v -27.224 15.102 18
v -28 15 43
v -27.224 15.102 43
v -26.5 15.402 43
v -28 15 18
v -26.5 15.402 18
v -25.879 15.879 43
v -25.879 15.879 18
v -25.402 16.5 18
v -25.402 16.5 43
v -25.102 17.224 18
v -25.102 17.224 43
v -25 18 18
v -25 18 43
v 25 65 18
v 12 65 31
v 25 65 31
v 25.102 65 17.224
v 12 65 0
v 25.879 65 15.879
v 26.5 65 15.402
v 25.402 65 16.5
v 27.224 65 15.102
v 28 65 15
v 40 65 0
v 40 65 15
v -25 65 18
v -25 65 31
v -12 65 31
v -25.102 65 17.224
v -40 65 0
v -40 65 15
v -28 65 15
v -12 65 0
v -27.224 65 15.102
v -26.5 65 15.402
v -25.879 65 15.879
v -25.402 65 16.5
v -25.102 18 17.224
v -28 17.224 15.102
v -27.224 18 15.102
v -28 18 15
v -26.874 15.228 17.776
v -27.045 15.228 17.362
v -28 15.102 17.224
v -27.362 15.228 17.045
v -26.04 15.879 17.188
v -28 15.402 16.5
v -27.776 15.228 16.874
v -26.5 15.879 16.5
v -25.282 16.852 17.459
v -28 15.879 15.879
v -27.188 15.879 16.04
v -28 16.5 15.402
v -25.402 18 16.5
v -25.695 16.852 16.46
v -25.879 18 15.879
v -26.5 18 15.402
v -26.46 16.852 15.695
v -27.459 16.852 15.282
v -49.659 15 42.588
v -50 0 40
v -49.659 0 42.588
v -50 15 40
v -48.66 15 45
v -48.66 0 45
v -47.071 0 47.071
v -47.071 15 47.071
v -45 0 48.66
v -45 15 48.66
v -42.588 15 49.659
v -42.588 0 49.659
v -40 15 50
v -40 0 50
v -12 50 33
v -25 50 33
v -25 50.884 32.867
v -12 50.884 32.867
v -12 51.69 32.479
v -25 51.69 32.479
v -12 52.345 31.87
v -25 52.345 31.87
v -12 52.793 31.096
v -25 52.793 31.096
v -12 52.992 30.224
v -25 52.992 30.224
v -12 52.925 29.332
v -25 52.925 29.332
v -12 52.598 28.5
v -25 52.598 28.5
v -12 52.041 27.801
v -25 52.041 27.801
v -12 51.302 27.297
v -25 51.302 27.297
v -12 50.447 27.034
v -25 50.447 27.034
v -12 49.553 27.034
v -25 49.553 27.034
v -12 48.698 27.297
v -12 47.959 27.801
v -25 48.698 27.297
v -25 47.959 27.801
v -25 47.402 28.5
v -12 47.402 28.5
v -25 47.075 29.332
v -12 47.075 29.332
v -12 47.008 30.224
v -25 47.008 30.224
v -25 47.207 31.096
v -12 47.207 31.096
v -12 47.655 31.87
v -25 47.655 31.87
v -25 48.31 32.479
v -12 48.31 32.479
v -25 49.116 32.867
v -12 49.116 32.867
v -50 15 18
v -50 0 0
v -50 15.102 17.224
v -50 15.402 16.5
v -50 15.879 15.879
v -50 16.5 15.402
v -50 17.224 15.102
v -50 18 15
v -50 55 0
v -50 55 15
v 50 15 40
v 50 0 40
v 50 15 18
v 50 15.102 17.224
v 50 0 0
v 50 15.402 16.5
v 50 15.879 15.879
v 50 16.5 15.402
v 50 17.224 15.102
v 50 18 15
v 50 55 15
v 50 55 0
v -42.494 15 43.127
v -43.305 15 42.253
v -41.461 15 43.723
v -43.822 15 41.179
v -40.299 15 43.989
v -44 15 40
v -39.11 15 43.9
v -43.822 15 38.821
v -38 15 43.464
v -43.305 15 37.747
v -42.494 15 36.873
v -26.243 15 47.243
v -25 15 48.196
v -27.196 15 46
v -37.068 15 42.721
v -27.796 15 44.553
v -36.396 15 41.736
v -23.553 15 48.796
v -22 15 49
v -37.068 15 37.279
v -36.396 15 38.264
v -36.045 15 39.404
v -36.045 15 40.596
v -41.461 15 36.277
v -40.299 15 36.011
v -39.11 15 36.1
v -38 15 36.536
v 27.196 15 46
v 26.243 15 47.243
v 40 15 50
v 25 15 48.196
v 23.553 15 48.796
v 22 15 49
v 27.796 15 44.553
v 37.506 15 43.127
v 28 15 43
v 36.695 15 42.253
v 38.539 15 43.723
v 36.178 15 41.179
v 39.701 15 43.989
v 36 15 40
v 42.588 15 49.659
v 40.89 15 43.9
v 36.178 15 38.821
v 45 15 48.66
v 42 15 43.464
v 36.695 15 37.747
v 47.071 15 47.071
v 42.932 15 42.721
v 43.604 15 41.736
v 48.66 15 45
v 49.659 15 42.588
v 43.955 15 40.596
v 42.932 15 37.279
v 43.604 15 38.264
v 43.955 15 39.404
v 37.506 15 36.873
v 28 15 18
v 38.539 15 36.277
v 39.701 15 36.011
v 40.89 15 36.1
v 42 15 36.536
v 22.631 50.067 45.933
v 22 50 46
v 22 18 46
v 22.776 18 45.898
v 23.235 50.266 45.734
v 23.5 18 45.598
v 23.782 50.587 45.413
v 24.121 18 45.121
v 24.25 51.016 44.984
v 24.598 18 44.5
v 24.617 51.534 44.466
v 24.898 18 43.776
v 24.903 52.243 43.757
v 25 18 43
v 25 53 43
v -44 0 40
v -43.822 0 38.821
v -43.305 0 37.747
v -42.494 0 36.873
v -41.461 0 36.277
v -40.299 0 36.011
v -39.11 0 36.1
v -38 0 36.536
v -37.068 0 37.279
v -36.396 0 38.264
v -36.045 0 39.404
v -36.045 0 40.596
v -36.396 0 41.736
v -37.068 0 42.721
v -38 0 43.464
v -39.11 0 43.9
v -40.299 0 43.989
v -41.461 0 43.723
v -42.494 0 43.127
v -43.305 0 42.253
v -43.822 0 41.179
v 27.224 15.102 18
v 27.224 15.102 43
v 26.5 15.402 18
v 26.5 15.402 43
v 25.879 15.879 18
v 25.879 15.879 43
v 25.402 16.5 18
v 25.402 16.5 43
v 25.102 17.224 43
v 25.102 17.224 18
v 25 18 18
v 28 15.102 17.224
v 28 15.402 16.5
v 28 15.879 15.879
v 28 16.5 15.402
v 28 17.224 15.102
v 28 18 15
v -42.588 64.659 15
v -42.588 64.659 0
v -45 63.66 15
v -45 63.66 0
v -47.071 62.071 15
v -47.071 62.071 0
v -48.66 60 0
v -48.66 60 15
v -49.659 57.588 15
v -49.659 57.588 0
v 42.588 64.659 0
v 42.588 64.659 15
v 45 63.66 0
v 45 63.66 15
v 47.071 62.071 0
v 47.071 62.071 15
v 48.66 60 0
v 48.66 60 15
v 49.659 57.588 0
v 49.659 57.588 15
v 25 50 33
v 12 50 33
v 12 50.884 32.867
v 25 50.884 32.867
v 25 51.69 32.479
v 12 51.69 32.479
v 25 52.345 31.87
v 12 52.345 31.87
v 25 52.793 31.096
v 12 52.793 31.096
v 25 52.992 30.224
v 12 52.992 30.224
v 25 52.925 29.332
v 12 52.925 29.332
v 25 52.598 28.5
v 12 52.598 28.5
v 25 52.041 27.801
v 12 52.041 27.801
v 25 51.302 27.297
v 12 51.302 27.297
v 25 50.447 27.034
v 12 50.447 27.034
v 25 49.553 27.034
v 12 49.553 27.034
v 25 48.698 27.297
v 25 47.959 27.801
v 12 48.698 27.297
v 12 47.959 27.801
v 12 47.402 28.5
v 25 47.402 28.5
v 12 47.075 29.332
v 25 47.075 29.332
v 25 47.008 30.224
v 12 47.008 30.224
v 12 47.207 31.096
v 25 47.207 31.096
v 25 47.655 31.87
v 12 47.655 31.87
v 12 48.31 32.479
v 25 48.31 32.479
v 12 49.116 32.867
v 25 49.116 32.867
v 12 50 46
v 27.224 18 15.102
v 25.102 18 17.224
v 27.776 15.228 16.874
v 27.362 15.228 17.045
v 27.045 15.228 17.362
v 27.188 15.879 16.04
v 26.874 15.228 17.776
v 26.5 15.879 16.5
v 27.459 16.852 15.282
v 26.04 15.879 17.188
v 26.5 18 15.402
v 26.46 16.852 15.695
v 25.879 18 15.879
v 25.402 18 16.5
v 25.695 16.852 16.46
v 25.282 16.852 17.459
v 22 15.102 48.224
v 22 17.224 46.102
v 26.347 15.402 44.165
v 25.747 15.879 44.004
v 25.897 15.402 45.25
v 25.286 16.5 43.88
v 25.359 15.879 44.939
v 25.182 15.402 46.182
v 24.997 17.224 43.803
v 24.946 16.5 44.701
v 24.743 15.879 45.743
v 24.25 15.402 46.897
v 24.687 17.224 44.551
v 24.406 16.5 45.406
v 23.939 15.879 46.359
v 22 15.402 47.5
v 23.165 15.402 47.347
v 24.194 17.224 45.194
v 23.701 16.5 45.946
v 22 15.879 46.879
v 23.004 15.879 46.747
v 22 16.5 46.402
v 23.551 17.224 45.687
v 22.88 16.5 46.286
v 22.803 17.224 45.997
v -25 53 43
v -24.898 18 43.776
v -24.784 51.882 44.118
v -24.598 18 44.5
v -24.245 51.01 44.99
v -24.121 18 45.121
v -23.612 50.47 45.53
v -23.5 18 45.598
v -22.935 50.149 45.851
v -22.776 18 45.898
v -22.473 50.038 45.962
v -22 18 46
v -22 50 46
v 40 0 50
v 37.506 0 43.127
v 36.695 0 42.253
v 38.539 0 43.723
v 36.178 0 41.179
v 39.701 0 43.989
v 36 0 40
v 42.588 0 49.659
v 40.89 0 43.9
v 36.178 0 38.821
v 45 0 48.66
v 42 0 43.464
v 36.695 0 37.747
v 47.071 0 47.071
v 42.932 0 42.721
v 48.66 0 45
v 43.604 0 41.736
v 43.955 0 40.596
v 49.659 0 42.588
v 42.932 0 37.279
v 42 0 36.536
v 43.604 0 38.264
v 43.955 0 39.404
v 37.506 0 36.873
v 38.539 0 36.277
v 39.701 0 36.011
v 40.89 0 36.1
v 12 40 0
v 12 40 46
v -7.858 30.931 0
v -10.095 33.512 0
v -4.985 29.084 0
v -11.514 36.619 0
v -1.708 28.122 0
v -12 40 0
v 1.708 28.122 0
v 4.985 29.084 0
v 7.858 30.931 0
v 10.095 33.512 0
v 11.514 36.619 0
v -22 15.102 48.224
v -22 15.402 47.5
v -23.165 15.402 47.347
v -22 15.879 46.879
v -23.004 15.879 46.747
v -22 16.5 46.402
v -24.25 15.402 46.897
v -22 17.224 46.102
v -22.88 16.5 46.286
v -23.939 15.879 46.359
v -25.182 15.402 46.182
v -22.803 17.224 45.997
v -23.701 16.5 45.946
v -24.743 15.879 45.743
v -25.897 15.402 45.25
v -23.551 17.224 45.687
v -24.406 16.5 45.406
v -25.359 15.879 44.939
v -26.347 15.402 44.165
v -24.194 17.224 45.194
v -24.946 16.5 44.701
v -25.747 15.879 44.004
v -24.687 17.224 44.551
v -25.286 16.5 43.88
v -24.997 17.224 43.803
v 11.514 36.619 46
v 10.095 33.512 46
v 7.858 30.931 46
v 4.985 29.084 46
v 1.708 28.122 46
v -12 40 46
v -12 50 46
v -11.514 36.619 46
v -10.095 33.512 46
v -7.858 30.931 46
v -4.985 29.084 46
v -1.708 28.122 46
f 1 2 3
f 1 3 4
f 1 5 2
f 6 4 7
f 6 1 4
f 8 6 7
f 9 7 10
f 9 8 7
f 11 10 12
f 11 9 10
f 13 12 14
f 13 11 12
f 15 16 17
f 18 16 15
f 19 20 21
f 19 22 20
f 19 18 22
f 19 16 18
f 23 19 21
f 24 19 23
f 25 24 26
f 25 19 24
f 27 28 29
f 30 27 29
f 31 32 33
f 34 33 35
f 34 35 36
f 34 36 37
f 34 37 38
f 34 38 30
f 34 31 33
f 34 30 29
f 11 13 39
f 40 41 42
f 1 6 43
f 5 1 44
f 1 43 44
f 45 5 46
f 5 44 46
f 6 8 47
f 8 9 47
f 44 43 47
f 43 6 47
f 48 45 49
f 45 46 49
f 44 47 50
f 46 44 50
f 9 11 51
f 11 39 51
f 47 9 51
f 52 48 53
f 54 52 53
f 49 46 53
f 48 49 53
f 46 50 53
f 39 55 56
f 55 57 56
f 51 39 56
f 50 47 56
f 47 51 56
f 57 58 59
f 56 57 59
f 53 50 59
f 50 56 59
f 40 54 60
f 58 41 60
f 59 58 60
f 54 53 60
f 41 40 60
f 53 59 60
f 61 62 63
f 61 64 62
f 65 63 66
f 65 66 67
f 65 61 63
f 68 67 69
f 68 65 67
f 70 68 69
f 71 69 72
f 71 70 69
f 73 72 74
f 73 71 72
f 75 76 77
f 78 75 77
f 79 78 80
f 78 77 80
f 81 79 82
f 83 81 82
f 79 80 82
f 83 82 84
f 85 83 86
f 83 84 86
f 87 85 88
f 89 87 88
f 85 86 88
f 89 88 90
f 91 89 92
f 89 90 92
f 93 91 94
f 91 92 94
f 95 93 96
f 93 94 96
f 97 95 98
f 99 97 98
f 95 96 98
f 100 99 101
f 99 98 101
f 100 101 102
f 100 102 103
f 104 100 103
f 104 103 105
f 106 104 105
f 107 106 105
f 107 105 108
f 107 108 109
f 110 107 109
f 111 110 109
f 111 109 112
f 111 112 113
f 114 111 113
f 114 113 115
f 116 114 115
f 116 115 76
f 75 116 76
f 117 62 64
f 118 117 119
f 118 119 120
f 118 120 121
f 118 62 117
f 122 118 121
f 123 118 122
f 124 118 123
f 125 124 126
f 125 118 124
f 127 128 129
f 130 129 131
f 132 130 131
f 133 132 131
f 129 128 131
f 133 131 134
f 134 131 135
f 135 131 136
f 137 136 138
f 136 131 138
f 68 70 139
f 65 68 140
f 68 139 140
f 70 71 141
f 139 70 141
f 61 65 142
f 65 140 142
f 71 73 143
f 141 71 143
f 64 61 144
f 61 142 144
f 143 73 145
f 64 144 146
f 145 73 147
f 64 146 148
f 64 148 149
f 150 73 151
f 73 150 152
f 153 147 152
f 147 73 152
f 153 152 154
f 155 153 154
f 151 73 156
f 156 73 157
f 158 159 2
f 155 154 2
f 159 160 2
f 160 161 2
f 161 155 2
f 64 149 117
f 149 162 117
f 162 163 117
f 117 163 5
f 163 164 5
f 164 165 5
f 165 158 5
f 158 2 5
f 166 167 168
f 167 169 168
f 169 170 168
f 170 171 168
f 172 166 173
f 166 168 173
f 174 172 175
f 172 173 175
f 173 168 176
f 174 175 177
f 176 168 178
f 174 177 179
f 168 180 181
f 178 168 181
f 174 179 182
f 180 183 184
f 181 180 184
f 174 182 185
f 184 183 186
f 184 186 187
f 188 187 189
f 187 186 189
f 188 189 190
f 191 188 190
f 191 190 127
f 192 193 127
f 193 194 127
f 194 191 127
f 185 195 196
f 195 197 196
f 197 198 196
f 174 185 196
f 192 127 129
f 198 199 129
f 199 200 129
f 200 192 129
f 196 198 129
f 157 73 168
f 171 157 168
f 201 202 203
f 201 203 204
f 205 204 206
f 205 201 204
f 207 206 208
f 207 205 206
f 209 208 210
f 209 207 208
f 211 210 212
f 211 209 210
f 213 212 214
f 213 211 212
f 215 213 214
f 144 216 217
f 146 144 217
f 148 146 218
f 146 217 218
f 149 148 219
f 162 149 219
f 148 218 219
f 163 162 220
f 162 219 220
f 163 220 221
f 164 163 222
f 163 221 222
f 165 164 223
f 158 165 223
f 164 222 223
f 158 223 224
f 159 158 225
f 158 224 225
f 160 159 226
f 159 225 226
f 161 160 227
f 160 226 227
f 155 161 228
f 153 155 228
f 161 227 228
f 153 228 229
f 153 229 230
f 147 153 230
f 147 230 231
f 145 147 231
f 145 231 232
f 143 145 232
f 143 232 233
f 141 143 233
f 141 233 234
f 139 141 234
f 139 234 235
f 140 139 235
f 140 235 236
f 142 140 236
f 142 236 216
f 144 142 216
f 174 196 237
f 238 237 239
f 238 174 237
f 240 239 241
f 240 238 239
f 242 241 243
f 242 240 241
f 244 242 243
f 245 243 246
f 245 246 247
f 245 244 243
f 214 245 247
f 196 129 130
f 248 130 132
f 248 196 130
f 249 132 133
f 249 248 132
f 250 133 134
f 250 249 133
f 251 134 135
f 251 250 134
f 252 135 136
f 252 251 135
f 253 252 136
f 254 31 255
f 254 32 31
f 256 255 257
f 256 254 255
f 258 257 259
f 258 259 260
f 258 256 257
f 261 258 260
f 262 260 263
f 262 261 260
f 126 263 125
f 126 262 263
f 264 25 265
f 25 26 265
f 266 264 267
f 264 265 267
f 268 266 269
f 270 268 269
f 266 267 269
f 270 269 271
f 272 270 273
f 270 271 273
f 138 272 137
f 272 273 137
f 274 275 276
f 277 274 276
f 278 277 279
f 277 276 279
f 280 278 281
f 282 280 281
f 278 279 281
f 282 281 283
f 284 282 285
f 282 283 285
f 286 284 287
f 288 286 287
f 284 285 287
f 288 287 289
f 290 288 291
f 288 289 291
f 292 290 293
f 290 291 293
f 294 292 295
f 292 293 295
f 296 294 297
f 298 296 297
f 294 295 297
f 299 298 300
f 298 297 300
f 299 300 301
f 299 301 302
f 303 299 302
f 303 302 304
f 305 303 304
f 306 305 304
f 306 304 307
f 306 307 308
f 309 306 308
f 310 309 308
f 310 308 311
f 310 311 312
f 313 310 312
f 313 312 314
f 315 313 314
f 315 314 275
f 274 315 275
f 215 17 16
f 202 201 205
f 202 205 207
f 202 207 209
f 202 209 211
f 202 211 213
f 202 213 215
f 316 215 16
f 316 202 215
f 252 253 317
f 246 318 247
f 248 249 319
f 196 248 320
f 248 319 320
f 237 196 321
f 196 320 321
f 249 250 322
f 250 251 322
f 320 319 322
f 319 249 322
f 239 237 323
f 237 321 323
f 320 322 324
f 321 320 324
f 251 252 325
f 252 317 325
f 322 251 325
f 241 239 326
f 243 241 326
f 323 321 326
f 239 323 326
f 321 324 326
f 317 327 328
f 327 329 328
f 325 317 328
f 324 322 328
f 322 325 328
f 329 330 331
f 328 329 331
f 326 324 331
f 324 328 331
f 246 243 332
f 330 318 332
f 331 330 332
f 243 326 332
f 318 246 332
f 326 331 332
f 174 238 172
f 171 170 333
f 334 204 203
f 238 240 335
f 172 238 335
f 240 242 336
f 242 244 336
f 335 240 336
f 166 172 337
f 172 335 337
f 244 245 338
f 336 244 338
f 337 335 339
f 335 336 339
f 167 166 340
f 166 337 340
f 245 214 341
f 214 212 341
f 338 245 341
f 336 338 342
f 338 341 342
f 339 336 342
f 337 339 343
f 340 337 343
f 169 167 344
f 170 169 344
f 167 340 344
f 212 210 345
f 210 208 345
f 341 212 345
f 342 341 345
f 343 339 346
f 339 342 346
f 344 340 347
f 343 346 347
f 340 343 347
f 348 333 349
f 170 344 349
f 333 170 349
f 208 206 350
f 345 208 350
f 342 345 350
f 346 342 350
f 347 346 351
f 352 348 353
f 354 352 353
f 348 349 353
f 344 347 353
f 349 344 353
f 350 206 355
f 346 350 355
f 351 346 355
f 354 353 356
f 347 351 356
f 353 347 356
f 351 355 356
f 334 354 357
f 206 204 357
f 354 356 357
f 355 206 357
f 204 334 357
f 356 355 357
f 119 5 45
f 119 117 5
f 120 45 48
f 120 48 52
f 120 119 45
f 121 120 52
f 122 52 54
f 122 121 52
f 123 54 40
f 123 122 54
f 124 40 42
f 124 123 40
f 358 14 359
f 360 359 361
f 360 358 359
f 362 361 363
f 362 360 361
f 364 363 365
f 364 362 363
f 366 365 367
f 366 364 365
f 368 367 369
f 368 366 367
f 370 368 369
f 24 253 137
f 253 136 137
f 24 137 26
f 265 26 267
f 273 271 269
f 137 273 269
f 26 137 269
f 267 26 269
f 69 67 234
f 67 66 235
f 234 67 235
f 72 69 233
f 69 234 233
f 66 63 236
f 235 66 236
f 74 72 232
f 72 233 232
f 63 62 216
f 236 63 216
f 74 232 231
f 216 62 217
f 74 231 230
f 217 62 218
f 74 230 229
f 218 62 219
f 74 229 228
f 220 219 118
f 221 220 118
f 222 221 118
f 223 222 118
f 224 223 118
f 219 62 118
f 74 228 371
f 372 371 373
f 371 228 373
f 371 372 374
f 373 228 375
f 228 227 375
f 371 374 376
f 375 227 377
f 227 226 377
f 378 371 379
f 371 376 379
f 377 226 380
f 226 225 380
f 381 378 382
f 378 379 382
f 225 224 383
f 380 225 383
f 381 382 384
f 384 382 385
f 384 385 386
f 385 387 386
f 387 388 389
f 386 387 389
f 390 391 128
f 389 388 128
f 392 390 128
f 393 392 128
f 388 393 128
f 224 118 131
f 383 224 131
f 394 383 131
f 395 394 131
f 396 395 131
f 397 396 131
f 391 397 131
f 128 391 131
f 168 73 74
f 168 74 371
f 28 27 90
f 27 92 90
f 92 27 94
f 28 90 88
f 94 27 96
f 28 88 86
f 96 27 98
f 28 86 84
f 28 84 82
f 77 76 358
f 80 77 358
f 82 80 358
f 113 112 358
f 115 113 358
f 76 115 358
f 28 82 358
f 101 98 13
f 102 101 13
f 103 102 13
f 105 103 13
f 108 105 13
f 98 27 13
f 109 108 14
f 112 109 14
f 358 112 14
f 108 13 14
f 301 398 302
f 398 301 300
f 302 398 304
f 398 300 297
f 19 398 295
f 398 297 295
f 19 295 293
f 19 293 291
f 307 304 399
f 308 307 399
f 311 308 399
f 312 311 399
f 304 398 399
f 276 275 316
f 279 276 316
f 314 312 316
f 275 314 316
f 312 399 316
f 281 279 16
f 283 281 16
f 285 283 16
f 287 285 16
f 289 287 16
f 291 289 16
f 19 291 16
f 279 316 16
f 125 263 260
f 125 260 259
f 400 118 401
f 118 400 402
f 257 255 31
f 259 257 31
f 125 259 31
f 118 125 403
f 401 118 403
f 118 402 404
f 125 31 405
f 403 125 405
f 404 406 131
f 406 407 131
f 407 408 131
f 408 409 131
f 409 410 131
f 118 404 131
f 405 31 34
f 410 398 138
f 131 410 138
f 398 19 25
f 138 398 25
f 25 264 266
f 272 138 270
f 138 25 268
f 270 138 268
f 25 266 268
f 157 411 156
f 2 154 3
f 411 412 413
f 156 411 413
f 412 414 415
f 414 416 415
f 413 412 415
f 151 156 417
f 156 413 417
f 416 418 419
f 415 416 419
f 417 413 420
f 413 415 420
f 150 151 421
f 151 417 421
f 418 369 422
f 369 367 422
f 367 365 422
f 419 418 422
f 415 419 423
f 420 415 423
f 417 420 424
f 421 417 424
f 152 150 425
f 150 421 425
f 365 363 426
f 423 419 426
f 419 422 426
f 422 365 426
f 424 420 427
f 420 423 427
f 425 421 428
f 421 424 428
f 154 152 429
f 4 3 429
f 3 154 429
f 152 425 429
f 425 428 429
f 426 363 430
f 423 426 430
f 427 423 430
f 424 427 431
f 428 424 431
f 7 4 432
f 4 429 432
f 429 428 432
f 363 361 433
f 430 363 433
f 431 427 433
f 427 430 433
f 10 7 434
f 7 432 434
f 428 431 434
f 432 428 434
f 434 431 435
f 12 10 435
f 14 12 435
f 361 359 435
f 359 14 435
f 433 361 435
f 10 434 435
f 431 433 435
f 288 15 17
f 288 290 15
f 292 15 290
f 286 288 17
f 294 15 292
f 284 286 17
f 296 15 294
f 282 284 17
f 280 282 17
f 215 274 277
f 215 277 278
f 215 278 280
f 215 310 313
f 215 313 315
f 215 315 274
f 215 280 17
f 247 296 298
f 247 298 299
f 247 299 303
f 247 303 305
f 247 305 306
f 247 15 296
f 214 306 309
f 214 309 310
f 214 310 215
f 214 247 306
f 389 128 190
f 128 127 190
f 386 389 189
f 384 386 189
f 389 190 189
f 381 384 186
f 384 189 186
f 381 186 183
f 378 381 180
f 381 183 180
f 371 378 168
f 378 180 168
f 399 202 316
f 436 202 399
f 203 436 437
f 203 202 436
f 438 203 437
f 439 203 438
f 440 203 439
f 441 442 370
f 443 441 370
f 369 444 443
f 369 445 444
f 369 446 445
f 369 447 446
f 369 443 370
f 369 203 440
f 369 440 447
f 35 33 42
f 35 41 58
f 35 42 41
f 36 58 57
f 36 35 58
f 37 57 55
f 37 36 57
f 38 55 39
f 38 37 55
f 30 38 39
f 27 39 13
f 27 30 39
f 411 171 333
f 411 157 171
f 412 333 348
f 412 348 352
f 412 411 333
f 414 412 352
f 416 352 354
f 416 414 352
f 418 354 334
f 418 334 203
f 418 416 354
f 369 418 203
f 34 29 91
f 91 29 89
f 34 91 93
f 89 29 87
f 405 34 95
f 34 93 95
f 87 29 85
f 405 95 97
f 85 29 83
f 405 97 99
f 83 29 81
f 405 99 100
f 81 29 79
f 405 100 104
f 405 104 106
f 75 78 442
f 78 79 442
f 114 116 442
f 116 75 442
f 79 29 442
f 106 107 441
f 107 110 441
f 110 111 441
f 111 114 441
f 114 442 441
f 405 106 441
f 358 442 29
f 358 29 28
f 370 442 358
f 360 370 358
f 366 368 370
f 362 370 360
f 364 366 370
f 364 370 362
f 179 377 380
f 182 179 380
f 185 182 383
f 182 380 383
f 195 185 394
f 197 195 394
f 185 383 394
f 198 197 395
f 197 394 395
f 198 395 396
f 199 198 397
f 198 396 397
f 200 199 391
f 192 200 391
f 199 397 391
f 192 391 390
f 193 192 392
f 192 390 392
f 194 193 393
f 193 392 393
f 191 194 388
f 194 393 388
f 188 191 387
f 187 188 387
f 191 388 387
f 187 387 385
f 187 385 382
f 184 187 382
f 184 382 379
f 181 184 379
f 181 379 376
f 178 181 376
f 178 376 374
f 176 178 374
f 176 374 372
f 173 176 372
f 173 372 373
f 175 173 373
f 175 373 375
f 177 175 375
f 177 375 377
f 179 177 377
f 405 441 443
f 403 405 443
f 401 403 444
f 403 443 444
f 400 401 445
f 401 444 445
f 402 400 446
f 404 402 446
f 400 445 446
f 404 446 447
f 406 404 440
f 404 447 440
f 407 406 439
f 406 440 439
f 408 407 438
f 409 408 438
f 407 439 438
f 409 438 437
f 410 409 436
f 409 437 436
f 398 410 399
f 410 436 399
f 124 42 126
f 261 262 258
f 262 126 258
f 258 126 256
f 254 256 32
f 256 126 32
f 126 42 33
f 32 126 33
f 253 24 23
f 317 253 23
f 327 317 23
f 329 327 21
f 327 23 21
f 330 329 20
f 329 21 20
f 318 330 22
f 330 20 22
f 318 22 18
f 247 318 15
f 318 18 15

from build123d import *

# Parameters (mm, degrees)
SKETCH1_W                = 100
SKETCH1_H                = 65
BASE_EXTRUDE_DEPTH       = 50
SKETCH2_W                = 35
SKETCH2_H                = 50
CUT_EXTRUDE1_DEPTH       = 130.325171564
SKETCH3_W                = 50
SKETCH3_H                = 31
BOSS_EXTRUDE1_DEPTH      = 50
CUT_EXTRUDE2_DEPTH       = 95.026591983
CHAMFER1_SIZE            = 15
FILLET1_R                = 10
FILLET2_R                = 3
FILLET3_R                = 3
FILLET4_R                = 3
F_8_0_8_DIAMETER_HOLE1_D = 8
F_6_0_6_DIAMETER_HOLE1_D = 6


with BuildPart() as part:
    # Sketch1 → Base-Extrude (new body)
    with BuildSketch(Plane.XY):
        with Locations((0, 32.5)):
            Rectangle(SKETCH1_W, SKETCH1_H)
    extrude(amount=BASE_EXTRUDE_DEPTH)

    # Sketch2 → Cut-Extrude1 (cut, through all)
    with BuildSketch(Plane(origin=(50, 0, 0), x_dir=(0, 0, -1), z_dir=(1, 0, 0))):
        with Locations((-32.5, 40)):
            Rectangle(SKETCH2_W, SKETCH2_H)
    extrude(amount=-CUT_EXTRUDE1_DEPTH, mode=Mode.SUBTRACT)

    # Sketch3 → Boss-Extrude1 (add)
    with BuildSketch(Plane(origin=(0, 15, 0), x_dir=(-1, 0, 0), z_dir=(0, 1, 0))):
        with Locations((0, 30.5)):
            Rectangle(SKETCH3_W, SKETCH3_H)
    extrude(amount=BOSS_EXTRUDE1_DEPTH)

    # Sketch4 → Cut-Extrude2 (cut, through all)
    with BuildSketch(Plane.XY.offset(46)):
        with BuildLine():
            Line((-12, 65), (-12, 40))
            ThreePointArc((-12, 40), (0, 28), (12, 40))
            Line((12, 40), (12, 65))
            Line((12, 65), (-12, 65))
        make_face()
    extrude(amount=-CUT_EXTRUDE2_DEPTH, mode=Mode.SUBTRACT)

    # Chamfer1
    chamfer1_edges = [part.edges().sort_by_distance(p)[0] for p in [
        (18.5, 65, 46),
        (-18.5, 65, 46),
    ]]
    chamfer(chamfer1_edges, length=CHAMFER1_SIZE)

    # Fillet1
    fillet1_edges = [part.edges().sort_by_distance(p)[0] for p in [
        (50, 7.5, 50),
        (-50, 7.5, 50),
        (-50, 65, 7.5),
        (50, 65, 7.5),
    ]]
    fillet(fillet1_edges, radius=FILLET1_R)

    # Fillet2
    fillet2_edges = [part.edges().sort_by_distance(p)[0] for p in [
        (25, 40, 15),
        (-25, 40, 15),
    ]]
    fillet(fillet2_edges, radius=FILLET2_R)

    # Fillet3
    fillet3_edges = [part.edges().sort_by_distance(p)[0] for p in [
        (-25, 32.5, 46),
        (25, 32.5, 46),
    ]]
    fillet(fillet3_edges, radius=FILLET3_R)

    # Fillet4
    fillet4_edges = [part.edges().sort_by_distance(p)[0] for p in [
        (0, 15, 46),
        (25, 15, 30.5),
        (-24.121320344, 15, 45.121320344),
        (24.121320344, 15, 45.121320344),
        (-39, 15, 15),
        (39, 15, 15),
        (-25, 15, 30.5),
        (-25.878679656, 15, 15.878679656),
        (25.878679656, 15, 15.878679656),
    ]]
    fillet(fillet4_edges, radius=FILLET4_R)

    # Ø8.0 (8) Diameter Hole1 (through all)
    with Locations(Plane(origin=(0, 15, 0), x_dir=(1, 0, 0), z_dir=(0, 1, 0))):
        with Locations((40, -40), (-40, -40)):
            Hole(F_8_0_8_DIAMETER_HOLE1_D / 2)

    # Ø6.0 (6) Diameter Hole1 (through all)
    with Locations(Plane(origin=(25, 0, 0), x_dir=(0, 0, -1), z_dir=(1, 0, 0))):
        with Locations((-30, 50)):
            Hole(F_6_0_6_DIAMETER_HOLE1_D / 2)


solid = part.part
